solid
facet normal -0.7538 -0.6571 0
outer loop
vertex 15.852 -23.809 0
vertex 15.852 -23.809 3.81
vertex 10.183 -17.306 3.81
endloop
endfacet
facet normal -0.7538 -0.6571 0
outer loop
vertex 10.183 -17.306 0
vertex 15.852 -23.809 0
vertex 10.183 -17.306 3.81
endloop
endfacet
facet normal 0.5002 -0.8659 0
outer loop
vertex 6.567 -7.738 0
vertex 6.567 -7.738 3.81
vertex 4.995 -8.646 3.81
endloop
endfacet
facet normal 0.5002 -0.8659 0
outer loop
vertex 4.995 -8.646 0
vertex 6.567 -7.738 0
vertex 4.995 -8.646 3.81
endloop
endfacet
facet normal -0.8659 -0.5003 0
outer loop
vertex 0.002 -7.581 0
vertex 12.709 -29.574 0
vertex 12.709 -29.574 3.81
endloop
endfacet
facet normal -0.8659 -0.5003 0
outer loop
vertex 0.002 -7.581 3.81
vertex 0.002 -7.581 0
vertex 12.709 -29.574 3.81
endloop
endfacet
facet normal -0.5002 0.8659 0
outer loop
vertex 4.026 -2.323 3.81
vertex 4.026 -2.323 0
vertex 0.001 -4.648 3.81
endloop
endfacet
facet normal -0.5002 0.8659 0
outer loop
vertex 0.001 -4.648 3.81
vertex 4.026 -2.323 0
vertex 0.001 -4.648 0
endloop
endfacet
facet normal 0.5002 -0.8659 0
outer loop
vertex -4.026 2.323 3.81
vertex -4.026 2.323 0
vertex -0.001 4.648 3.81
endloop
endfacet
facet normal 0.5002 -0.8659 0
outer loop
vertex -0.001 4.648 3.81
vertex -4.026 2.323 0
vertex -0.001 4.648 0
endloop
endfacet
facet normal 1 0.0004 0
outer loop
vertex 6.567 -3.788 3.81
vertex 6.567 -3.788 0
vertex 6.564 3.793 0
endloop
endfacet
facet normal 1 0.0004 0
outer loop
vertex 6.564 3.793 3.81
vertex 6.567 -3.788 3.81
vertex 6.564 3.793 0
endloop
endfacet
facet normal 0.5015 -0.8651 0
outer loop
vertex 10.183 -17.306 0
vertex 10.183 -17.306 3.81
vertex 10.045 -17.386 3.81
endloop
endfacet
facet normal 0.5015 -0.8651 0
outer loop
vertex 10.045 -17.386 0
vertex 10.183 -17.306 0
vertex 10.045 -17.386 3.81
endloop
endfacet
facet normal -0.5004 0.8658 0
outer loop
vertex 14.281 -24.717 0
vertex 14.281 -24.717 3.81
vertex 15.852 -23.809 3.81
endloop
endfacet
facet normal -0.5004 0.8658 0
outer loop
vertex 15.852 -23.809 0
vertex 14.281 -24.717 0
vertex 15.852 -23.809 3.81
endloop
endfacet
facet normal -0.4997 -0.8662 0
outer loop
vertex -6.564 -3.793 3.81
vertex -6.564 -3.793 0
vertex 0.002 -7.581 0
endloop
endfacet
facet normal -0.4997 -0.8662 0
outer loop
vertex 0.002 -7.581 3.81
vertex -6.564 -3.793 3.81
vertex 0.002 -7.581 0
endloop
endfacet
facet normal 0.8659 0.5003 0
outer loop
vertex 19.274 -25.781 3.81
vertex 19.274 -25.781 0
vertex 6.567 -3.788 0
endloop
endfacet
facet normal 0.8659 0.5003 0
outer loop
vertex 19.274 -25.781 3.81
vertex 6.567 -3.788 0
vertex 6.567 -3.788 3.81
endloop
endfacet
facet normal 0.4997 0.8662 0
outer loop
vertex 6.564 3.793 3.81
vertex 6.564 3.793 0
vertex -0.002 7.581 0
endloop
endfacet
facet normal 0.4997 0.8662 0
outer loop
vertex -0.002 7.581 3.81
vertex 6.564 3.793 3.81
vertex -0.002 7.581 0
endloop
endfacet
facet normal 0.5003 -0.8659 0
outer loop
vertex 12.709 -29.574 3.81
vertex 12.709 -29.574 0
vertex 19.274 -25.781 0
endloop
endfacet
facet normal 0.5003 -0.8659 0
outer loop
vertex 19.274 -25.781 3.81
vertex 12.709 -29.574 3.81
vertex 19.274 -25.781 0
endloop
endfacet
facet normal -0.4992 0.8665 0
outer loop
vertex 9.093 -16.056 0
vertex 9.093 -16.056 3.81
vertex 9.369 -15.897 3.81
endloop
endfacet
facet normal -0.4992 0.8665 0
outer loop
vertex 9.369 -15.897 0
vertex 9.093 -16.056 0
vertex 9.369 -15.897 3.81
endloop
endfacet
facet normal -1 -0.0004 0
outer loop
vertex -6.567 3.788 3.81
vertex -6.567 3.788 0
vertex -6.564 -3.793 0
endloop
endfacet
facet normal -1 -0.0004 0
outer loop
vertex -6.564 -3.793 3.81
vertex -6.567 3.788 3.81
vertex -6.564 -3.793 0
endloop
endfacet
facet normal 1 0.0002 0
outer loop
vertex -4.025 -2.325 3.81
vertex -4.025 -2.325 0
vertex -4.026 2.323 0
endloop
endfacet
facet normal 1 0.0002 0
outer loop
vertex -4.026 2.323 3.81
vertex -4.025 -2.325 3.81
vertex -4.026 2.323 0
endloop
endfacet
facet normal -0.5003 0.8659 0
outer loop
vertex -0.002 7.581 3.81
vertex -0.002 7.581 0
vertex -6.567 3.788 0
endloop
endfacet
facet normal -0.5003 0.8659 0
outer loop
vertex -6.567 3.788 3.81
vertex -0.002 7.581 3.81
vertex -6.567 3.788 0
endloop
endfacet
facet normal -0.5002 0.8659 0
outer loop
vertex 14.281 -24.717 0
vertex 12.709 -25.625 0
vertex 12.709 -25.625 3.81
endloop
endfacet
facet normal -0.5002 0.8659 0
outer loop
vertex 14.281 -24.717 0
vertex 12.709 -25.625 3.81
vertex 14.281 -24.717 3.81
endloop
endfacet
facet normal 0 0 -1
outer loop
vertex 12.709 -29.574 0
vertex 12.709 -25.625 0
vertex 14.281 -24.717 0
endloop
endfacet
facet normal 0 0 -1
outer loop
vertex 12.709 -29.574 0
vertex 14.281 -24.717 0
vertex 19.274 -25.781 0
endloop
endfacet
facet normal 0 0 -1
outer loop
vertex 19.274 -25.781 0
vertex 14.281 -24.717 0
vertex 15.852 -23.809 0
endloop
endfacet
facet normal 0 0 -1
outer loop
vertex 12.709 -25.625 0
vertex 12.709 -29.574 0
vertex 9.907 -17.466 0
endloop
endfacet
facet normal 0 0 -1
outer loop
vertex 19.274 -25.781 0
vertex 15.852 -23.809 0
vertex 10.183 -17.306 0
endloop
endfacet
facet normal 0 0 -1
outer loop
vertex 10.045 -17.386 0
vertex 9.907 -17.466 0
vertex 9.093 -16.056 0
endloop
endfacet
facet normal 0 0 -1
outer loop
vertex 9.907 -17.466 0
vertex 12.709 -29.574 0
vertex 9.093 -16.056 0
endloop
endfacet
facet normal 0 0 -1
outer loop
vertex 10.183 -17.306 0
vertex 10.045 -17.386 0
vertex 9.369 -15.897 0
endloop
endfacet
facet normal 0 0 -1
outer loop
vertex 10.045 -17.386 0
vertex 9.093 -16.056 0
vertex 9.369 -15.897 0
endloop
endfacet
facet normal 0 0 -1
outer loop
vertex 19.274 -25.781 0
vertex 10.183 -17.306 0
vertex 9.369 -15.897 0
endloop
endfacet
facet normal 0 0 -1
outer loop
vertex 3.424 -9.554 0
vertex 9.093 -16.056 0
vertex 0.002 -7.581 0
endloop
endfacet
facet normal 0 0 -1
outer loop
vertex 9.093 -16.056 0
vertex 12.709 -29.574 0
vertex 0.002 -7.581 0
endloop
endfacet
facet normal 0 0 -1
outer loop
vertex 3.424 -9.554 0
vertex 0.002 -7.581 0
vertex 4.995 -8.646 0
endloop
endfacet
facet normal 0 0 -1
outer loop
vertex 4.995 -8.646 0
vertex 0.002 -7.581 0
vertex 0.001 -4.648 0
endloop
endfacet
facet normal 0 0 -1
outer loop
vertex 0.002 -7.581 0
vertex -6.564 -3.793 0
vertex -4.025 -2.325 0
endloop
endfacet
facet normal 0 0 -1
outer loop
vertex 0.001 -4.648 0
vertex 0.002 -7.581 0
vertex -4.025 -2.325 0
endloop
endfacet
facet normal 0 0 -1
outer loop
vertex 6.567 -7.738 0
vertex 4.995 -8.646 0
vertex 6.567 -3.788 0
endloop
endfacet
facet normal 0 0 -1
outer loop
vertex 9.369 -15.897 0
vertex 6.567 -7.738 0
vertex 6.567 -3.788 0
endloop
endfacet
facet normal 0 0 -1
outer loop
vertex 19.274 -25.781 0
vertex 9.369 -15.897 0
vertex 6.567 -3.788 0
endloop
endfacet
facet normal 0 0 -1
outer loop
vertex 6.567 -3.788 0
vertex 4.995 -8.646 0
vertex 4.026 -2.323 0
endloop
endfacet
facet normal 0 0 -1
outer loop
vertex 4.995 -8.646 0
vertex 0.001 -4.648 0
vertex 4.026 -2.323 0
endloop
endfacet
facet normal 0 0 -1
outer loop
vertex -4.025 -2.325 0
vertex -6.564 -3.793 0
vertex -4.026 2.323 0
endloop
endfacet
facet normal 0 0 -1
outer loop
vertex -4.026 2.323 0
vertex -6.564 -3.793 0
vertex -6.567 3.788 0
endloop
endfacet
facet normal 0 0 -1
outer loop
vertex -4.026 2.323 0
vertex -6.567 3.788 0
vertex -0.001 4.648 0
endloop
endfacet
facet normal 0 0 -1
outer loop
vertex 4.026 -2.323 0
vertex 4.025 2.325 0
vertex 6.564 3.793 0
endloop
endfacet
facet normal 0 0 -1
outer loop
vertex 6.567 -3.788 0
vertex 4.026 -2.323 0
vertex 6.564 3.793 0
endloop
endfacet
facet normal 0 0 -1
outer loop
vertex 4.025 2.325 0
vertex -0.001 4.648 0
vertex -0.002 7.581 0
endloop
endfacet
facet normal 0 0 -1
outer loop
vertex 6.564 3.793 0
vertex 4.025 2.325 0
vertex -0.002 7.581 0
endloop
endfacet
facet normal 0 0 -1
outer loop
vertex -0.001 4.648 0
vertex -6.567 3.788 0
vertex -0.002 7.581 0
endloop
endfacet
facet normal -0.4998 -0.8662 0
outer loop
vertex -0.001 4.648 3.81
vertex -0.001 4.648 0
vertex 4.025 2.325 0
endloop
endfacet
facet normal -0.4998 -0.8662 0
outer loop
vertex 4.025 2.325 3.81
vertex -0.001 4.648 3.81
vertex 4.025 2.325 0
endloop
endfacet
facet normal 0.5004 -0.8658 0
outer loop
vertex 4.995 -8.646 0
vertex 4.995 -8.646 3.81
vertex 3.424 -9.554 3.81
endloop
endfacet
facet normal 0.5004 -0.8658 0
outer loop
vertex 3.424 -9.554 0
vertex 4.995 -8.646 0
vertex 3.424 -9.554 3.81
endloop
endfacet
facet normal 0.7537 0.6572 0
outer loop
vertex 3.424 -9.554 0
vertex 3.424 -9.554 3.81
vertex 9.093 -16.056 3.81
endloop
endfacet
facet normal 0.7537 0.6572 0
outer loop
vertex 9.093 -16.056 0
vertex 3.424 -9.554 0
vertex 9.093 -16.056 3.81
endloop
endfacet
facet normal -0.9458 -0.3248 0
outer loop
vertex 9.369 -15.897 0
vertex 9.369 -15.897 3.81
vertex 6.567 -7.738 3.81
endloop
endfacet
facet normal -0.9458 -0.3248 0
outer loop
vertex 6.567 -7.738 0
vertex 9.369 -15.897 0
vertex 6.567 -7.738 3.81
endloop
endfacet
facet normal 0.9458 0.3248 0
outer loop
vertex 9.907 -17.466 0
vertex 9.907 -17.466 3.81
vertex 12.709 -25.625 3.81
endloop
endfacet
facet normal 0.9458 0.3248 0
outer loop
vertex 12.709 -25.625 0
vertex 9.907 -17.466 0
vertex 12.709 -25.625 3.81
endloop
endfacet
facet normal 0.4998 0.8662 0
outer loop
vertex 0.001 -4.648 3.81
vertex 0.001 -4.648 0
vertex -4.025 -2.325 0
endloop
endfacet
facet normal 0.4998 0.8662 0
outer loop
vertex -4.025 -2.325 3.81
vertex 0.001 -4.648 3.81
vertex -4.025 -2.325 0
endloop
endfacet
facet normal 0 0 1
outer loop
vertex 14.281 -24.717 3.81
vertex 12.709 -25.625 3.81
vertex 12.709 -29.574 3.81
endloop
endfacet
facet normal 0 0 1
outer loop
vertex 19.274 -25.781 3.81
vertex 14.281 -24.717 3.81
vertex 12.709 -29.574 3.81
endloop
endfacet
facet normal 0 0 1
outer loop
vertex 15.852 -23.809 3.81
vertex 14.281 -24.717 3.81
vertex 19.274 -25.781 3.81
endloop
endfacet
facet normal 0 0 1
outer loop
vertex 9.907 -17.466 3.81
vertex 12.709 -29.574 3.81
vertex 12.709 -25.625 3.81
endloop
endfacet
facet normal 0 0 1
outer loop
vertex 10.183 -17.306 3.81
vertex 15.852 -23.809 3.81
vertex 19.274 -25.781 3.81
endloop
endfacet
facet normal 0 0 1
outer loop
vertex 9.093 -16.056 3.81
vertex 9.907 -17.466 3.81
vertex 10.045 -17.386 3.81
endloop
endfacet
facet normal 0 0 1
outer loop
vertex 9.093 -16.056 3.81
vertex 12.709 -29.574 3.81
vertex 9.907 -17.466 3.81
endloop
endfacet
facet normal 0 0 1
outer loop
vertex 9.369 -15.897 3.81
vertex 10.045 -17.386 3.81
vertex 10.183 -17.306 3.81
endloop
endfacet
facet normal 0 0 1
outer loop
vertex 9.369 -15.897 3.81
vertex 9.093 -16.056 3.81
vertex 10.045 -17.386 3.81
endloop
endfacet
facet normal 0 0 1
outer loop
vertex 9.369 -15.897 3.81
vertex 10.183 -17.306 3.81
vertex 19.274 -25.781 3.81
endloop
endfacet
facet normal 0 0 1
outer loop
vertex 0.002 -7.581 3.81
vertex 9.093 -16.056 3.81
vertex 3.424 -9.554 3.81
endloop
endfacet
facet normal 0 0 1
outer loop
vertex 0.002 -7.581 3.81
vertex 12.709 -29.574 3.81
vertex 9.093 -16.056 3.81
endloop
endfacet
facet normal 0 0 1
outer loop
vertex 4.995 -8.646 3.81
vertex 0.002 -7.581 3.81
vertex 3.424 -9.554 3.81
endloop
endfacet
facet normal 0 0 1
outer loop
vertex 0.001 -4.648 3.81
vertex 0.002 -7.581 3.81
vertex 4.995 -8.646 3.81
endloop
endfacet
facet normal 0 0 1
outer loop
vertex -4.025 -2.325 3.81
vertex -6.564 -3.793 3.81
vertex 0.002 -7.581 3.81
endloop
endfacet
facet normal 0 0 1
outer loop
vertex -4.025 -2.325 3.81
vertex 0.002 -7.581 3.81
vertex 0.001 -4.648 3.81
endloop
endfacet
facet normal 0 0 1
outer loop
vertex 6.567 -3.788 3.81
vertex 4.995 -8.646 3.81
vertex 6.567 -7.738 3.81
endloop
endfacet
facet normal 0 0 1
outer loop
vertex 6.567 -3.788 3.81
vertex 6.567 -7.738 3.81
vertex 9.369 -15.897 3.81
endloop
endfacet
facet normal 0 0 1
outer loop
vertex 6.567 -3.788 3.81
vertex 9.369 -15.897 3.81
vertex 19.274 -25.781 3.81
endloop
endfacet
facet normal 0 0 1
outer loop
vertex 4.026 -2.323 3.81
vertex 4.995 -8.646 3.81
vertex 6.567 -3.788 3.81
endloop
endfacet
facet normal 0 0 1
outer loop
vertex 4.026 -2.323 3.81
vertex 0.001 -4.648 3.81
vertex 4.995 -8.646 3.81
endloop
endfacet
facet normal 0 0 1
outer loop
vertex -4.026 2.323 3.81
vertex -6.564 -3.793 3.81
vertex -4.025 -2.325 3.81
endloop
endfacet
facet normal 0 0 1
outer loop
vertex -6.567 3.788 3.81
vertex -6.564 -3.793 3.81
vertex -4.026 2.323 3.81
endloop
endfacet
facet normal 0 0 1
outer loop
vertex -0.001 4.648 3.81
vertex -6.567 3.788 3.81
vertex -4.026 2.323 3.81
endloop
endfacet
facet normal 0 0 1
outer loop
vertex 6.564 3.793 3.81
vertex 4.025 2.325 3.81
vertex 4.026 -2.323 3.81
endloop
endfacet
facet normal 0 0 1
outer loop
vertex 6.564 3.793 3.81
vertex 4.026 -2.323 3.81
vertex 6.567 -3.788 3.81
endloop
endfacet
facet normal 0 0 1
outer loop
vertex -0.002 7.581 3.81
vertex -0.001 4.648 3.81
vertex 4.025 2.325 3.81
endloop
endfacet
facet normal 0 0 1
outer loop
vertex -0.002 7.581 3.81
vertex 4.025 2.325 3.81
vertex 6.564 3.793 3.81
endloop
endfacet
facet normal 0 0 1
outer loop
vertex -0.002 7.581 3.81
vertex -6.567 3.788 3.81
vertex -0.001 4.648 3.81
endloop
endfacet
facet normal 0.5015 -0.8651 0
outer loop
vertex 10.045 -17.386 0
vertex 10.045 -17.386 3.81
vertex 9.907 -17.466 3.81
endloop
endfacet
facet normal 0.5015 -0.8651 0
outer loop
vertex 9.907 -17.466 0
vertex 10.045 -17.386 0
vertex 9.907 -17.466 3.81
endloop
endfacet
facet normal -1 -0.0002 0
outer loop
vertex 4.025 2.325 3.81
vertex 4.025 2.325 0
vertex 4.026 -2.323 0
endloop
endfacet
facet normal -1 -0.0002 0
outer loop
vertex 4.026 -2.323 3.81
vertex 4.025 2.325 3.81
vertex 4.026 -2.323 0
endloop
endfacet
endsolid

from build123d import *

# Parameters (mm, degrees)
F1_DEPTH = 3.81
F2_DEPTH = 25.4
F4_DEPTH = 25.4


with BuildPart() as f1:
    # F0 (on Top) → F1 (new body)
    with BuildSketch(Plane.XY):
        Polygon((6.5642443103, 3.7926732977), (-0.0024292689, 7.5811389783), (-6.5666735793, 3.7884656805), (-6.5642443103, -3.7926732977), (0.0024292689, -7.5811389783), (6.5666735793, -3.7884656805), align=None)
        Polygon((-4.0262038002, 2.3228099792), (-0.00148945, 4.6481997614), (4.0247143502, 2.3253897822), (4.0262038002, -2.3228099792), (0.00148945, -4.6481997614), (-4.0247143502, -2.3253897822), align=None, mode=Mode.SUBTRACT)
    extrude(amount=F1_DEPTH)

    # F2 (add): a face of the model
    f2_faces = [f1.faces().sort_by_distance(p)[0] for p in [
        (3.2845514241, -5.6848023294, 1.905),
    ]]
    extrude(f2_faces, amount=F2_DEPTH)

    # F3 (on face) → F4 (cut)
    with BuildSketch(Plane.XY.offset(3.81)):
        Polygon((3.4240530816, -9.5536917259), (9.0931520865, -16.0562525411), (9.3687364086, -15.8970260939), (6.5666733931, -7.7379561169), (4.9953633304, -8.6458238677), align=None)
        Polygon((9.9074144135, -17.4655531656), (12.7094772591, -25.6246232408), (14.2807875079, -24.7167553825), (10.0452065827, -17.3859399373), align=None)
        Polygon((10.0452065827, -17.3859399373), (14.2807875079, -24.7167553825), (15.8520975706, -23.8088876318), (10.1829987356, -17.3063267185), align=None)
    extrude(amount=-F4_DEPTH, mode=Mode.SUBTRACT)


solid = f1.part
